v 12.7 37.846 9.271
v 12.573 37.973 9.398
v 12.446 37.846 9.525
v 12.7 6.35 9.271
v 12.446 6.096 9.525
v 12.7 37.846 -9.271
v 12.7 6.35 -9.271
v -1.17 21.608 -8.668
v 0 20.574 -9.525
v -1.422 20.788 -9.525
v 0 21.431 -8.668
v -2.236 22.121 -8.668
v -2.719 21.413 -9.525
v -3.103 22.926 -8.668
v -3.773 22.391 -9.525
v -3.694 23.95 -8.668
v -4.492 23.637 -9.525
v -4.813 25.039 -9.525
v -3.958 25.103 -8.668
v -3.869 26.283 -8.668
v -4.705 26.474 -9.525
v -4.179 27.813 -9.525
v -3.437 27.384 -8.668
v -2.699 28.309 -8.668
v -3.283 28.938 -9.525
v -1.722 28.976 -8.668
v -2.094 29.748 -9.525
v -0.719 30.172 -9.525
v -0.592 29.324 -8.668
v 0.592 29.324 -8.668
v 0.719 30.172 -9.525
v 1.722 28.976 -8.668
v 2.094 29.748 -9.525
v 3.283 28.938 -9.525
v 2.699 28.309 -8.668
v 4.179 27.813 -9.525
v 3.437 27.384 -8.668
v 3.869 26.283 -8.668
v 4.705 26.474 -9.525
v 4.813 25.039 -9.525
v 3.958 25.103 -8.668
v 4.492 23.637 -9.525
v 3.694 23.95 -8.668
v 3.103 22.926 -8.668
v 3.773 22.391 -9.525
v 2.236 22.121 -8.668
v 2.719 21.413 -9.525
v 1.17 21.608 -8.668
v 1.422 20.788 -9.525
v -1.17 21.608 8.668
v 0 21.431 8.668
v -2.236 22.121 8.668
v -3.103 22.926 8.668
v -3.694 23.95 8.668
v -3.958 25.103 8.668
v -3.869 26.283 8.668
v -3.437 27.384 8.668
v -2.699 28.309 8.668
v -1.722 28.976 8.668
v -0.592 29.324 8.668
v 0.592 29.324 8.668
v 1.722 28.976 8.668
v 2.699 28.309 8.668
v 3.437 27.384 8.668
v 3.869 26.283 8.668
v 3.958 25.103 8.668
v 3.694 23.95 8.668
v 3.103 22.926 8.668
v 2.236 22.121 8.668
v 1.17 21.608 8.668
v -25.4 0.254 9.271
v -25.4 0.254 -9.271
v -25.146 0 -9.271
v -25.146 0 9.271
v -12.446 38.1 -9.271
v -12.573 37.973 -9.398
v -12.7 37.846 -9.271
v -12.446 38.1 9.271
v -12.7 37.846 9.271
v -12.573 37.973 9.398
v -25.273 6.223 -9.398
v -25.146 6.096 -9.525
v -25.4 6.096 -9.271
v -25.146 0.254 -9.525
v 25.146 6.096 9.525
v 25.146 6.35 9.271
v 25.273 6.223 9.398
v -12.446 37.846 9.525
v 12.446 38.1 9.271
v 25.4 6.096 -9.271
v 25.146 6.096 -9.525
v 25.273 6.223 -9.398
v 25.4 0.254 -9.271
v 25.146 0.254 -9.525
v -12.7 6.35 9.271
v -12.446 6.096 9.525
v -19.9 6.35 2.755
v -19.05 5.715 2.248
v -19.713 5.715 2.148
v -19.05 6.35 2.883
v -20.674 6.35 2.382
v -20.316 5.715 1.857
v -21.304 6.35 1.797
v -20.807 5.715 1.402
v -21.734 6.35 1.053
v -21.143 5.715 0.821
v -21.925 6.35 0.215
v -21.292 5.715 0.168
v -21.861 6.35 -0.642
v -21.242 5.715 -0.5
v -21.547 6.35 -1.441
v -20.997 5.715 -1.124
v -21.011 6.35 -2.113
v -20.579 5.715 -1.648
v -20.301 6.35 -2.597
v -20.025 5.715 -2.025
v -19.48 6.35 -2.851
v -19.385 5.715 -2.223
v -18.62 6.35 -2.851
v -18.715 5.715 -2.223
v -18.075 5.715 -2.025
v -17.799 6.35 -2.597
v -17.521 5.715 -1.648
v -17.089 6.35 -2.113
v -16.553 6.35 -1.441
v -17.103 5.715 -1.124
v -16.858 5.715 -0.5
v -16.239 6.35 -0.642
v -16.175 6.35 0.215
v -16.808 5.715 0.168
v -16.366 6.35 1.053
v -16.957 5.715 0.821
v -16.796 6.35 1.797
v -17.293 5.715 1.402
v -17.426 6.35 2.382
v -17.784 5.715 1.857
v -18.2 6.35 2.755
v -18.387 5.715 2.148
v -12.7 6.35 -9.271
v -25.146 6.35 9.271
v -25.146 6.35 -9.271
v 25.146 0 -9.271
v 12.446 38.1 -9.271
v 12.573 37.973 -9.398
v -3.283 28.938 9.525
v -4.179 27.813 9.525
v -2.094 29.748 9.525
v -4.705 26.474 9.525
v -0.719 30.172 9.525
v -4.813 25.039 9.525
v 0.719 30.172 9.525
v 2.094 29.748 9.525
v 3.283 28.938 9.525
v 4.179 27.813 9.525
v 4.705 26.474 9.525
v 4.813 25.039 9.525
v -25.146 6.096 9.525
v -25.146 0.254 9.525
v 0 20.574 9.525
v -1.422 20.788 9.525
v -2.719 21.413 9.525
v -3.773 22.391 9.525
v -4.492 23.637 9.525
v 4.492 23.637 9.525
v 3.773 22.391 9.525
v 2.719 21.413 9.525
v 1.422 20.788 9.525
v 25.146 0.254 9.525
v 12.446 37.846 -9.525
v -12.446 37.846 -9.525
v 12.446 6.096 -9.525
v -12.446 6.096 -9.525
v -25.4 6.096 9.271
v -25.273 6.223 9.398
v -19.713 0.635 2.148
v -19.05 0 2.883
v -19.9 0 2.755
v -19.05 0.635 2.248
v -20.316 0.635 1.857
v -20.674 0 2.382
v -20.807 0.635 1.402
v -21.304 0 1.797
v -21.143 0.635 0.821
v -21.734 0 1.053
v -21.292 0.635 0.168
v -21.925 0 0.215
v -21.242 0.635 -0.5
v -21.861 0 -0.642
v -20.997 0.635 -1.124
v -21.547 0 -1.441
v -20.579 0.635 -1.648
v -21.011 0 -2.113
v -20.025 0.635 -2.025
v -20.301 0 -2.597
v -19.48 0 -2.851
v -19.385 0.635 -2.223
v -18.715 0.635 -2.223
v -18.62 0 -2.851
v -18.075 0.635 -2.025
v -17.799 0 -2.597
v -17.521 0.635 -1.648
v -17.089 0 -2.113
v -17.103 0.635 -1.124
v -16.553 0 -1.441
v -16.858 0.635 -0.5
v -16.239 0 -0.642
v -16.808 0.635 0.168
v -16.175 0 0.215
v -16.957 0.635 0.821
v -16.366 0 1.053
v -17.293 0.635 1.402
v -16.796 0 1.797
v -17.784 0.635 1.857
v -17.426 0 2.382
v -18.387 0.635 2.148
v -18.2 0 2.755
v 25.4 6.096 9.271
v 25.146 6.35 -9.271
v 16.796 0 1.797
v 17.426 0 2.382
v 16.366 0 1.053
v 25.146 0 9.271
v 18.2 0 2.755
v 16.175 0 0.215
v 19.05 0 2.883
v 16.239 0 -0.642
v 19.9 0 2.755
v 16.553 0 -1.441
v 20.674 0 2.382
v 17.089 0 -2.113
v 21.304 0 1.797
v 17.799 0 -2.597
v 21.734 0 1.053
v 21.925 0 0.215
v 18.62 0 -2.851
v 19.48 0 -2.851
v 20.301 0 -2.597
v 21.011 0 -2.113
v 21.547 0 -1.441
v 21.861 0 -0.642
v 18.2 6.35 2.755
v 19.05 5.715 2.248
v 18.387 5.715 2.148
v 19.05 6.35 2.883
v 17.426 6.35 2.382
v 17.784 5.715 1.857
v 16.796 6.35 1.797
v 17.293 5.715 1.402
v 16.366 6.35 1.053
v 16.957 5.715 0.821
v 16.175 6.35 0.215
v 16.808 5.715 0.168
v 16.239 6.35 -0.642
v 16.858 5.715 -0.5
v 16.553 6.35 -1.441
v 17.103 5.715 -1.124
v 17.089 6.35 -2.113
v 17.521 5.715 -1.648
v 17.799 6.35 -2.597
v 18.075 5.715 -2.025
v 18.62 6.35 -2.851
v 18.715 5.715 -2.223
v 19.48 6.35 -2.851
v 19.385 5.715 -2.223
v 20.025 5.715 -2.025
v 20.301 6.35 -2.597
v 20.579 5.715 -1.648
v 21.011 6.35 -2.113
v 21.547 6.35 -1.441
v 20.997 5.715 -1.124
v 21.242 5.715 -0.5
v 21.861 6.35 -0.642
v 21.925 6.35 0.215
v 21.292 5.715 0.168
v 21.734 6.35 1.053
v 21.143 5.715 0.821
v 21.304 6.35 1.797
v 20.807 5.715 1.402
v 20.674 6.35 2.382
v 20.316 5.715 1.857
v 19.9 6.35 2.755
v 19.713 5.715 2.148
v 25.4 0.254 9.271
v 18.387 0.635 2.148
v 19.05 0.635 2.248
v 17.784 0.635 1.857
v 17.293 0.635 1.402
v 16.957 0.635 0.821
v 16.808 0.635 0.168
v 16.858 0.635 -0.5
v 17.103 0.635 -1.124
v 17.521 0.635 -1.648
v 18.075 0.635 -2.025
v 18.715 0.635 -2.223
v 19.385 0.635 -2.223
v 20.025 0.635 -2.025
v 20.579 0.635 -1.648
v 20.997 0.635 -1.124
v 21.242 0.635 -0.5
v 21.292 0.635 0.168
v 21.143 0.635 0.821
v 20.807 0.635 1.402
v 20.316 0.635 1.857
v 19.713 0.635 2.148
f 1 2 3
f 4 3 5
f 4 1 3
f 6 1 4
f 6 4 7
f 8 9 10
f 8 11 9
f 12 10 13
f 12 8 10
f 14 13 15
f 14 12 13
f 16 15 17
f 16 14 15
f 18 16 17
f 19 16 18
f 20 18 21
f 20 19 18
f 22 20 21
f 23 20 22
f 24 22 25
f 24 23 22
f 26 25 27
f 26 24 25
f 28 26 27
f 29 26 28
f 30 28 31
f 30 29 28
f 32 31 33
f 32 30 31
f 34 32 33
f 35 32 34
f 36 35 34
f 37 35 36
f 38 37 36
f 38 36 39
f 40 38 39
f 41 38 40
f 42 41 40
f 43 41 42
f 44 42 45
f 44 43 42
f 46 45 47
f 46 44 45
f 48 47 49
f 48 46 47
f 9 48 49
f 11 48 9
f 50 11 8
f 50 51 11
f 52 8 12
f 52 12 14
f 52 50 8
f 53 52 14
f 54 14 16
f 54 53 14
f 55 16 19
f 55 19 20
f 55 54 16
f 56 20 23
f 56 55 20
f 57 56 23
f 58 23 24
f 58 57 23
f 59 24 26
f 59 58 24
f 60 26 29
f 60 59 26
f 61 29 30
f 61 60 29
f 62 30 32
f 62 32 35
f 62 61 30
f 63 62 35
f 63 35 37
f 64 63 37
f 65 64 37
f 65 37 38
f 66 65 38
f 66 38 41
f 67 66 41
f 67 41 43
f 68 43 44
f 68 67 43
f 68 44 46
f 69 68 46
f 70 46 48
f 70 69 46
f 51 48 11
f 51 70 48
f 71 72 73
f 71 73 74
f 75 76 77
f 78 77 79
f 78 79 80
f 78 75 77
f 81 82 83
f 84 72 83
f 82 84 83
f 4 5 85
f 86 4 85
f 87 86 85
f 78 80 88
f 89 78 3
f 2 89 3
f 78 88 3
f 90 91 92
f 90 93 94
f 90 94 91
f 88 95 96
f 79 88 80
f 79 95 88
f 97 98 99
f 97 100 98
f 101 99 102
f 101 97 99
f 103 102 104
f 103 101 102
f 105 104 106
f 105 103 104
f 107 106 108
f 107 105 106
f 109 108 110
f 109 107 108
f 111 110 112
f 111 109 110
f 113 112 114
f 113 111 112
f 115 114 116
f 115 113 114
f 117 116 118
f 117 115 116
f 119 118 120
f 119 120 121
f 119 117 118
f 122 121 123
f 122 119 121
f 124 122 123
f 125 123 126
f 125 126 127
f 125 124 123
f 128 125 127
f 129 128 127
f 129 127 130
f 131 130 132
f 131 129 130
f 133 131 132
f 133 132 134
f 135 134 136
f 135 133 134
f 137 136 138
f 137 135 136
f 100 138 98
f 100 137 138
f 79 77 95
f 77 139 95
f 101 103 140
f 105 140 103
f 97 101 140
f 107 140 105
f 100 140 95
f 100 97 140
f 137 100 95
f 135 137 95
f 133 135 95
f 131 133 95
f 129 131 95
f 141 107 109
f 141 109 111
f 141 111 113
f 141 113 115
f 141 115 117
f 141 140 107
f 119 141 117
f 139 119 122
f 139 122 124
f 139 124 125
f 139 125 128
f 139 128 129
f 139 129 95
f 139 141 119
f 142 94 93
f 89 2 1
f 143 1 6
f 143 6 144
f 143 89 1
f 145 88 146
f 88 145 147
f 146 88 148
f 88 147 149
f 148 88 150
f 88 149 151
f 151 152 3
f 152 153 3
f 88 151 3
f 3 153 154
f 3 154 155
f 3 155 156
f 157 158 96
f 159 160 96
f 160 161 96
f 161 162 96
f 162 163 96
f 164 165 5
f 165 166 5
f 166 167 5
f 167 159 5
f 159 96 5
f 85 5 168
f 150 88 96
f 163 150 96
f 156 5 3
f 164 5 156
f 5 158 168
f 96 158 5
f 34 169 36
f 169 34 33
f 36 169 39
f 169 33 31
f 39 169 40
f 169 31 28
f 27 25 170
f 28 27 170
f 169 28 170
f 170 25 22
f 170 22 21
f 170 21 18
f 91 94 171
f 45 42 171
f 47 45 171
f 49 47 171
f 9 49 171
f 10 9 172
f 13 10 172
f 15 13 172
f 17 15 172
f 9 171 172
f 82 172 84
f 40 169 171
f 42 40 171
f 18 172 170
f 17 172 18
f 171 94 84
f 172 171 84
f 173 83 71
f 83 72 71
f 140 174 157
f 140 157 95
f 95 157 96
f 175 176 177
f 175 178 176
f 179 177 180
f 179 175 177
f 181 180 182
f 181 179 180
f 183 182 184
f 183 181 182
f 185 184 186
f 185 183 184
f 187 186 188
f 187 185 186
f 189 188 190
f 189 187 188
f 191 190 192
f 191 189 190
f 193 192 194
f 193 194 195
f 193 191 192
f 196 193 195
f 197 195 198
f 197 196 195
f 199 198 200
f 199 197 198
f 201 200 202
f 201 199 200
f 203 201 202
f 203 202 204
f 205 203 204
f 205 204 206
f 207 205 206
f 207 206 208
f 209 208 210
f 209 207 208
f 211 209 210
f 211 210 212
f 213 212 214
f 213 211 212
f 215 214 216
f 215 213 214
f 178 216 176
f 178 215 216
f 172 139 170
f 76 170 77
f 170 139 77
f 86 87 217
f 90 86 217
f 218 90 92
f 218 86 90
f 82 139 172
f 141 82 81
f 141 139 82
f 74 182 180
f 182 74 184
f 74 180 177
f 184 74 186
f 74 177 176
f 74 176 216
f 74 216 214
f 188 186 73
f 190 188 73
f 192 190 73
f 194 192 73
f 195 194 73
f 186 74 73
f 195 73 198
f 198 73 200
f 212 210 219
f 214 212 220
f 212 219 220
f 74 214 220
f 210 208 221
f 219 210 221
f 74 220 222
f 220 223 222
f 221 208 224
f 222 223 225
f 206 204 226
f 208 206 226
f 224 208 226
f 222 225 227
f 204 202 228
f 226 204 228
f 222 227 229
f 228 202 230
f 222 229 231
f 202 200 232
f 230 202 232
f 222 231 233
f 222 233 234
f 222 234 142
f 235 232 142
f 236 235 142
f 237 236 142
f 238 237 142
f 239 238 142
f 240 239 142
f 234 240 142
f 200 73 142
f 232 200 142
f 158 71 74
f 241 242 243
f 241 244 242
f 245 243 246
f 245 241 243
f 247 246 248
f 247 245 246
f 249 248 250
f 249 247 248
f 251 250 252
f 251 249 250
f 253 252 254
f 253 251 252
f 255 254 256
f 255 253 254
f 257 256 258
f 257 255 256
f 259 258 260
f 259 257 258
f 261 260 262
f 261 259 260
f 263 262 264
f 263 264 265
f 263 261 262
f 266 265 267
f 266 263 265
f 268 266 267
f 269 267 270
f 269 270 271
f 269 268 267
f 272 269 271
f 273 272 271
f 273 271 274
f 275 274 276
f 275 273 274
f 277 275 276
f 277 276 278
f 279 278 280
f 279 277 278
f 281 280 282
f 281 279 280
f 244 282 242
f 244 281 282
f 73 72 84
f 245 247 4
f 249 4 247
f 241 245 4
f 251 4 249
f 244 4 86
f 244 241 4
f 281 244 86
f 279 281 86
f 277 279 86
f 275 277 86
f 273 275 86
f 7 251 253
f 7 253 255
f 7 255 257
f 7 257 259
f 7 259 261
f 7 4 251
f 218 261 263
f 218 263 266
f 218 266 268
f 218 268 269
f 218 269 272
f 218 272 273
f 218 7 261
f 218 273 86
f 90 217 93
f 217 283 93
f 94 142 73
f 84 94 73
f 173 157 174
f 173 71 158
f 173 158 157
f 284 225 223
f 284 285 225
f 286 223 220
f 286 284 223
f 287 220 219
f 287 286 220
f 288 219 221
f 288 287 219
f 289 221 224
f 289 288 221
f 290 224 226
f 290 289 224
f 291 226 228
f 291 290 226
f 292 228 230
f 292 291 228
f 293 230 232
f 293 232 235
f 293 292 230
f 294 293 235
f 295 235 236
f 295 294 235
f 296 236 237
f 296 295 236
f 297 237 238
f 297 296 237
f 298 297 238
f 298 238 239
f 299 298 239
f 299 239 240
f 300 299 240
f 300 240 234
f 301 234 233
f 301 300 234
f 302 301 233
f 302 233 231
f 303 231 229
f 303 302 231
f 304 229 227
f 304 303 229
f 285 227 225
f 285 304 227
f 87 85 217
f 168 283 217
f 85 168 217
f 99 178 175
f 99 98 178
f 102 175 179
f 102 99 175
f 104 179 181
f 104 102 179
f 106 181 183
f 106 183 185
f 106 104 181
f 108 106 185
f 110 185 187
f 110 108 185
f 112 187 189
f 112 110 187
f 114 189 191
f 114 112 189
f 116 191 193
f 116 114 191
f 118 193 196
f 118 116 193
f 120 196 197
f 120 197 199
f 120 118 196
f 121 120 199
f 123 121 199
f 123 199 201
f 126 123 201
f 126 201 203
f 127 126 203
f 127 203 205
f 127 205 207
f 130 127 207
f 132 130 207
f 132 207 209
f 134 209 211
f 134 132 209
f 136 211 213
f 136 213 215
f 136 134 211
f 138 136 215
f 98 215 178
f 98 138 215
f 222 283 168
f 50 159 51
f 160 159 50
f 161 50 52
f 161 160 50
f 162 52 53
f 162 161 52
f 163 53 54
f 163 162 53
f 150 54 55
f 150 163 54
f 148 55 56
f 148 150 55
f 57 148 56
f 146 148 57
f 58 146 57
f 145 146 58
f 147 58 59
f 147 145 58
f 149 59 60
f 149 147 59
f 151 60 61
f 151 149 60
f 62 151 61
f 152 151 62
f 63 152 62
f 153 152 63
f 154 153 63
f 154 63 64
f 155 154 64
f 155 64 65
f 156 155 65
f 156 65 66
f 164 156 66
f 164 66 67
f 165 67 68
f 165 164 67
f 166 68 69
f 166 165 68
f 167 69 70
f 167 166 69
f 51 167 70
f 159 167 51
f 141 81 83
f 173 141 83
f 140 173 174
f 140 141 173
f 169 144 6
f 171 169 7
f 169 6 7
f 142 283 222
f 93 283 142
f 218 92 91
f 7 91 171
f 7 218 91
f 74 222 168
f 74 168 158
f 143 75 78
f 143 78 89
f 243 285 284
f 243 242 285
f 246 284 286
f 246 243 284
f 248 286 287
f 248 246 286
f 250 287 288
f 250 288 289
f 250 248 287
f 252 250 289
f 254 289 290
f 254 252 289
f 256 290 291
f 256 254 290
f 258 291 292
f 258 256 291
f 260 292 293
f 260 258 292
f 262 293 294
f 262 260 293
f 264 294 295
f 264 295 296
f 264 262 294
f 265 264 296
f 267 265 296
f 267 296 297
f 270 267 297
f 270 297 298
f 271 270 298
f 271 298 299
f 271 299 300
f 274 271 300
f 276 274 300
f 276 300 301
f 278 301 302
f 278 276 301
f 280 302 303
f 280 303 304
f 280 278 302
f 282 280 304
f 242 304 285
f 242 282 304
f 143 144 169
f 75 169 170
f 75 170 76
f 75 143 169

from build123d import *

# Parameters (mm, degrees)
BOSS_EXTRUDE1_DEPTH            = 6.35
BOSS_EXTRUDE2_DEPTH            = 38.1
F_8_CLEARANCE_HOLE1_AT_2_COUNT = 2
F_8_CLEARANCE_HOLE1_AT_2_PITCH = 38.1
CHAMFER1_SIZE                  = 0.254
CHAMFER2_SIZE                  = 0.254


with BuildPart() as part:
    # Sketch1 → Boss-Extrude1 (new body)
    with BuildSketch(Plane(origin=(0, 0, 0), x_dir=(1, 0, 0), z_dir=(0, 1, 0))):
        Polygon((-25.4, 9.525), (-25.4, -9.525), (-12.699999999999996, -9.525), (-12.700000000000003, 9.524999999999993), align=None)
        Polygon((-12.700000000000003, 9.524999999999993), (-12.699999999999996, -9.525), (12.700000000000003, -9.525), (12.700000000000003, 9.524999999999997), align=None)
        Polygon((12.700000000000003, 9.524999999999997), (12.700000000000003, -9.524999999999997), (25.4, -9.525), (25.4, 9.525), align=None)
    extrude(amount=BOSS_EXTRUDE1_DEPTH)

    # Sketch1<3> → Boss-Extrude2 (add)
    with BuildSketch(Plane(origin=(0, 0, 0), x_dir=(1, 0, 0), z_dir=(0, 1, 0))):
        Polygon((-12.700000000000003, 9.524999999999993), (-12.699999999999996, -9.525), (12.700000000000003, -9.525), (12.700000000000003, 9.524999999999997), align=None)
    extrude(amount=BOSS_EXTRUDE2_DEPTH)

    # Sketch4 → 3/8-16 Tapped Hole1 (revolve, cut)
    with BuildSketch(Plane(origin=(0, 25.4, 9.525), x_dir=(0, -1, 0), z_dir=(1, 0, 0))):
        Polygon((0, 0), (-4.67e-15, 19.05), (4.825999999999995, 19.05), (3.9687499999999956, 18.192749999999993), (3.9687499999999973, 0.8572500000000004), (4.826, 0), align=None)
    revolve(axis=Axis((0, 25.4, 15.874999999999991), (0, 0, -1)), mode=Mode.SUBTRACT)

    # Sketch8 → #8 Clearance Hole1 (revolve, cut)
    with BuildSketch(Plane(origin=(-19.05, 6.35, 4.66e-15), x_dir=(0, 0, 1), z_dir=(1, 0, 0))):
        Polygon((0, 0), (-1.56e-15, 6.350000000000001), (2.8828999999999985, 6.350000000000001), (2.247899999999996, 5.714999999999998), (2.247899999999997, 0.6350000000000001), (2.8829, 0), align=None)
    f_8_clearance_hole1 = revolve(axis=Axis((-19.05, 12.69999999999999, 4.66e-15), (0, -1, 0)), mode=Mode.SUBTRACT)

    # #8 Clearance Hole1 at 2: #8 Clearance Hole1 ×2
    with Locations(*[(i * F_8_CLEARANCE_HOLE1_AT_2_PITCH, 0, 0) for i in range(1, F_8_CLEARANCE_HOLE1_AT_2_COUNT)]):
        add(f_8_clearance_hole1, mode=Mode.SUBTRACT)

    # Chamfer1
    chamfer1_edges = [part.edges().sort_by_distance(p)[0] for p in [
        (25.4, 6.35, 0),
        (-19.05, 6.35, -9.525),
        (19.050000000000004, 6.35, 9.525),
        (19.050000000000004, 6.35, -9.525),
        (-25.4, 6.35, 0),
        (0, 38.1, -9.525),
        (-12.7, 38.1, 3.55e-15),
        (3.55e-15, 38.1, 9.525),
        (12.700000000000003, 38.1, 0),
        (-19.049999999999997, 6.35, 9.525),
    ]]
    chamfer(chamfer1_edges, length=CHAMFER1_SIZE)

    # Chamfer2
    chamfer2_edges = [part.edges().sort_by_distance(p)[0] for p in [
        (25.4, 3.048, -9.525),
        (25.4, 3.048, 9.525),
        (-25.4, 3.048, -9.525),
        (-25.4, 3.048, 9.525),
        (-25.4, 0, 0),
        (0, 0, -9.525),
        (25.4, 0, 0),
        (0, 0, 9.525),
        (12.700000000000003, 21.971000000000004, -9.524999999999999),
        (12.700000000000003, 21.971000000000004, 9.524999999999999),
        (-12.699999999999996, 21.971000000000004, 9.525),
        (-12.700000000000003, 21.971000000000004, -9.524999999999999),
    ]]
    chamfer(chamfer2_edges, length=CHAMFER2_SIZE)


solid = part.part
